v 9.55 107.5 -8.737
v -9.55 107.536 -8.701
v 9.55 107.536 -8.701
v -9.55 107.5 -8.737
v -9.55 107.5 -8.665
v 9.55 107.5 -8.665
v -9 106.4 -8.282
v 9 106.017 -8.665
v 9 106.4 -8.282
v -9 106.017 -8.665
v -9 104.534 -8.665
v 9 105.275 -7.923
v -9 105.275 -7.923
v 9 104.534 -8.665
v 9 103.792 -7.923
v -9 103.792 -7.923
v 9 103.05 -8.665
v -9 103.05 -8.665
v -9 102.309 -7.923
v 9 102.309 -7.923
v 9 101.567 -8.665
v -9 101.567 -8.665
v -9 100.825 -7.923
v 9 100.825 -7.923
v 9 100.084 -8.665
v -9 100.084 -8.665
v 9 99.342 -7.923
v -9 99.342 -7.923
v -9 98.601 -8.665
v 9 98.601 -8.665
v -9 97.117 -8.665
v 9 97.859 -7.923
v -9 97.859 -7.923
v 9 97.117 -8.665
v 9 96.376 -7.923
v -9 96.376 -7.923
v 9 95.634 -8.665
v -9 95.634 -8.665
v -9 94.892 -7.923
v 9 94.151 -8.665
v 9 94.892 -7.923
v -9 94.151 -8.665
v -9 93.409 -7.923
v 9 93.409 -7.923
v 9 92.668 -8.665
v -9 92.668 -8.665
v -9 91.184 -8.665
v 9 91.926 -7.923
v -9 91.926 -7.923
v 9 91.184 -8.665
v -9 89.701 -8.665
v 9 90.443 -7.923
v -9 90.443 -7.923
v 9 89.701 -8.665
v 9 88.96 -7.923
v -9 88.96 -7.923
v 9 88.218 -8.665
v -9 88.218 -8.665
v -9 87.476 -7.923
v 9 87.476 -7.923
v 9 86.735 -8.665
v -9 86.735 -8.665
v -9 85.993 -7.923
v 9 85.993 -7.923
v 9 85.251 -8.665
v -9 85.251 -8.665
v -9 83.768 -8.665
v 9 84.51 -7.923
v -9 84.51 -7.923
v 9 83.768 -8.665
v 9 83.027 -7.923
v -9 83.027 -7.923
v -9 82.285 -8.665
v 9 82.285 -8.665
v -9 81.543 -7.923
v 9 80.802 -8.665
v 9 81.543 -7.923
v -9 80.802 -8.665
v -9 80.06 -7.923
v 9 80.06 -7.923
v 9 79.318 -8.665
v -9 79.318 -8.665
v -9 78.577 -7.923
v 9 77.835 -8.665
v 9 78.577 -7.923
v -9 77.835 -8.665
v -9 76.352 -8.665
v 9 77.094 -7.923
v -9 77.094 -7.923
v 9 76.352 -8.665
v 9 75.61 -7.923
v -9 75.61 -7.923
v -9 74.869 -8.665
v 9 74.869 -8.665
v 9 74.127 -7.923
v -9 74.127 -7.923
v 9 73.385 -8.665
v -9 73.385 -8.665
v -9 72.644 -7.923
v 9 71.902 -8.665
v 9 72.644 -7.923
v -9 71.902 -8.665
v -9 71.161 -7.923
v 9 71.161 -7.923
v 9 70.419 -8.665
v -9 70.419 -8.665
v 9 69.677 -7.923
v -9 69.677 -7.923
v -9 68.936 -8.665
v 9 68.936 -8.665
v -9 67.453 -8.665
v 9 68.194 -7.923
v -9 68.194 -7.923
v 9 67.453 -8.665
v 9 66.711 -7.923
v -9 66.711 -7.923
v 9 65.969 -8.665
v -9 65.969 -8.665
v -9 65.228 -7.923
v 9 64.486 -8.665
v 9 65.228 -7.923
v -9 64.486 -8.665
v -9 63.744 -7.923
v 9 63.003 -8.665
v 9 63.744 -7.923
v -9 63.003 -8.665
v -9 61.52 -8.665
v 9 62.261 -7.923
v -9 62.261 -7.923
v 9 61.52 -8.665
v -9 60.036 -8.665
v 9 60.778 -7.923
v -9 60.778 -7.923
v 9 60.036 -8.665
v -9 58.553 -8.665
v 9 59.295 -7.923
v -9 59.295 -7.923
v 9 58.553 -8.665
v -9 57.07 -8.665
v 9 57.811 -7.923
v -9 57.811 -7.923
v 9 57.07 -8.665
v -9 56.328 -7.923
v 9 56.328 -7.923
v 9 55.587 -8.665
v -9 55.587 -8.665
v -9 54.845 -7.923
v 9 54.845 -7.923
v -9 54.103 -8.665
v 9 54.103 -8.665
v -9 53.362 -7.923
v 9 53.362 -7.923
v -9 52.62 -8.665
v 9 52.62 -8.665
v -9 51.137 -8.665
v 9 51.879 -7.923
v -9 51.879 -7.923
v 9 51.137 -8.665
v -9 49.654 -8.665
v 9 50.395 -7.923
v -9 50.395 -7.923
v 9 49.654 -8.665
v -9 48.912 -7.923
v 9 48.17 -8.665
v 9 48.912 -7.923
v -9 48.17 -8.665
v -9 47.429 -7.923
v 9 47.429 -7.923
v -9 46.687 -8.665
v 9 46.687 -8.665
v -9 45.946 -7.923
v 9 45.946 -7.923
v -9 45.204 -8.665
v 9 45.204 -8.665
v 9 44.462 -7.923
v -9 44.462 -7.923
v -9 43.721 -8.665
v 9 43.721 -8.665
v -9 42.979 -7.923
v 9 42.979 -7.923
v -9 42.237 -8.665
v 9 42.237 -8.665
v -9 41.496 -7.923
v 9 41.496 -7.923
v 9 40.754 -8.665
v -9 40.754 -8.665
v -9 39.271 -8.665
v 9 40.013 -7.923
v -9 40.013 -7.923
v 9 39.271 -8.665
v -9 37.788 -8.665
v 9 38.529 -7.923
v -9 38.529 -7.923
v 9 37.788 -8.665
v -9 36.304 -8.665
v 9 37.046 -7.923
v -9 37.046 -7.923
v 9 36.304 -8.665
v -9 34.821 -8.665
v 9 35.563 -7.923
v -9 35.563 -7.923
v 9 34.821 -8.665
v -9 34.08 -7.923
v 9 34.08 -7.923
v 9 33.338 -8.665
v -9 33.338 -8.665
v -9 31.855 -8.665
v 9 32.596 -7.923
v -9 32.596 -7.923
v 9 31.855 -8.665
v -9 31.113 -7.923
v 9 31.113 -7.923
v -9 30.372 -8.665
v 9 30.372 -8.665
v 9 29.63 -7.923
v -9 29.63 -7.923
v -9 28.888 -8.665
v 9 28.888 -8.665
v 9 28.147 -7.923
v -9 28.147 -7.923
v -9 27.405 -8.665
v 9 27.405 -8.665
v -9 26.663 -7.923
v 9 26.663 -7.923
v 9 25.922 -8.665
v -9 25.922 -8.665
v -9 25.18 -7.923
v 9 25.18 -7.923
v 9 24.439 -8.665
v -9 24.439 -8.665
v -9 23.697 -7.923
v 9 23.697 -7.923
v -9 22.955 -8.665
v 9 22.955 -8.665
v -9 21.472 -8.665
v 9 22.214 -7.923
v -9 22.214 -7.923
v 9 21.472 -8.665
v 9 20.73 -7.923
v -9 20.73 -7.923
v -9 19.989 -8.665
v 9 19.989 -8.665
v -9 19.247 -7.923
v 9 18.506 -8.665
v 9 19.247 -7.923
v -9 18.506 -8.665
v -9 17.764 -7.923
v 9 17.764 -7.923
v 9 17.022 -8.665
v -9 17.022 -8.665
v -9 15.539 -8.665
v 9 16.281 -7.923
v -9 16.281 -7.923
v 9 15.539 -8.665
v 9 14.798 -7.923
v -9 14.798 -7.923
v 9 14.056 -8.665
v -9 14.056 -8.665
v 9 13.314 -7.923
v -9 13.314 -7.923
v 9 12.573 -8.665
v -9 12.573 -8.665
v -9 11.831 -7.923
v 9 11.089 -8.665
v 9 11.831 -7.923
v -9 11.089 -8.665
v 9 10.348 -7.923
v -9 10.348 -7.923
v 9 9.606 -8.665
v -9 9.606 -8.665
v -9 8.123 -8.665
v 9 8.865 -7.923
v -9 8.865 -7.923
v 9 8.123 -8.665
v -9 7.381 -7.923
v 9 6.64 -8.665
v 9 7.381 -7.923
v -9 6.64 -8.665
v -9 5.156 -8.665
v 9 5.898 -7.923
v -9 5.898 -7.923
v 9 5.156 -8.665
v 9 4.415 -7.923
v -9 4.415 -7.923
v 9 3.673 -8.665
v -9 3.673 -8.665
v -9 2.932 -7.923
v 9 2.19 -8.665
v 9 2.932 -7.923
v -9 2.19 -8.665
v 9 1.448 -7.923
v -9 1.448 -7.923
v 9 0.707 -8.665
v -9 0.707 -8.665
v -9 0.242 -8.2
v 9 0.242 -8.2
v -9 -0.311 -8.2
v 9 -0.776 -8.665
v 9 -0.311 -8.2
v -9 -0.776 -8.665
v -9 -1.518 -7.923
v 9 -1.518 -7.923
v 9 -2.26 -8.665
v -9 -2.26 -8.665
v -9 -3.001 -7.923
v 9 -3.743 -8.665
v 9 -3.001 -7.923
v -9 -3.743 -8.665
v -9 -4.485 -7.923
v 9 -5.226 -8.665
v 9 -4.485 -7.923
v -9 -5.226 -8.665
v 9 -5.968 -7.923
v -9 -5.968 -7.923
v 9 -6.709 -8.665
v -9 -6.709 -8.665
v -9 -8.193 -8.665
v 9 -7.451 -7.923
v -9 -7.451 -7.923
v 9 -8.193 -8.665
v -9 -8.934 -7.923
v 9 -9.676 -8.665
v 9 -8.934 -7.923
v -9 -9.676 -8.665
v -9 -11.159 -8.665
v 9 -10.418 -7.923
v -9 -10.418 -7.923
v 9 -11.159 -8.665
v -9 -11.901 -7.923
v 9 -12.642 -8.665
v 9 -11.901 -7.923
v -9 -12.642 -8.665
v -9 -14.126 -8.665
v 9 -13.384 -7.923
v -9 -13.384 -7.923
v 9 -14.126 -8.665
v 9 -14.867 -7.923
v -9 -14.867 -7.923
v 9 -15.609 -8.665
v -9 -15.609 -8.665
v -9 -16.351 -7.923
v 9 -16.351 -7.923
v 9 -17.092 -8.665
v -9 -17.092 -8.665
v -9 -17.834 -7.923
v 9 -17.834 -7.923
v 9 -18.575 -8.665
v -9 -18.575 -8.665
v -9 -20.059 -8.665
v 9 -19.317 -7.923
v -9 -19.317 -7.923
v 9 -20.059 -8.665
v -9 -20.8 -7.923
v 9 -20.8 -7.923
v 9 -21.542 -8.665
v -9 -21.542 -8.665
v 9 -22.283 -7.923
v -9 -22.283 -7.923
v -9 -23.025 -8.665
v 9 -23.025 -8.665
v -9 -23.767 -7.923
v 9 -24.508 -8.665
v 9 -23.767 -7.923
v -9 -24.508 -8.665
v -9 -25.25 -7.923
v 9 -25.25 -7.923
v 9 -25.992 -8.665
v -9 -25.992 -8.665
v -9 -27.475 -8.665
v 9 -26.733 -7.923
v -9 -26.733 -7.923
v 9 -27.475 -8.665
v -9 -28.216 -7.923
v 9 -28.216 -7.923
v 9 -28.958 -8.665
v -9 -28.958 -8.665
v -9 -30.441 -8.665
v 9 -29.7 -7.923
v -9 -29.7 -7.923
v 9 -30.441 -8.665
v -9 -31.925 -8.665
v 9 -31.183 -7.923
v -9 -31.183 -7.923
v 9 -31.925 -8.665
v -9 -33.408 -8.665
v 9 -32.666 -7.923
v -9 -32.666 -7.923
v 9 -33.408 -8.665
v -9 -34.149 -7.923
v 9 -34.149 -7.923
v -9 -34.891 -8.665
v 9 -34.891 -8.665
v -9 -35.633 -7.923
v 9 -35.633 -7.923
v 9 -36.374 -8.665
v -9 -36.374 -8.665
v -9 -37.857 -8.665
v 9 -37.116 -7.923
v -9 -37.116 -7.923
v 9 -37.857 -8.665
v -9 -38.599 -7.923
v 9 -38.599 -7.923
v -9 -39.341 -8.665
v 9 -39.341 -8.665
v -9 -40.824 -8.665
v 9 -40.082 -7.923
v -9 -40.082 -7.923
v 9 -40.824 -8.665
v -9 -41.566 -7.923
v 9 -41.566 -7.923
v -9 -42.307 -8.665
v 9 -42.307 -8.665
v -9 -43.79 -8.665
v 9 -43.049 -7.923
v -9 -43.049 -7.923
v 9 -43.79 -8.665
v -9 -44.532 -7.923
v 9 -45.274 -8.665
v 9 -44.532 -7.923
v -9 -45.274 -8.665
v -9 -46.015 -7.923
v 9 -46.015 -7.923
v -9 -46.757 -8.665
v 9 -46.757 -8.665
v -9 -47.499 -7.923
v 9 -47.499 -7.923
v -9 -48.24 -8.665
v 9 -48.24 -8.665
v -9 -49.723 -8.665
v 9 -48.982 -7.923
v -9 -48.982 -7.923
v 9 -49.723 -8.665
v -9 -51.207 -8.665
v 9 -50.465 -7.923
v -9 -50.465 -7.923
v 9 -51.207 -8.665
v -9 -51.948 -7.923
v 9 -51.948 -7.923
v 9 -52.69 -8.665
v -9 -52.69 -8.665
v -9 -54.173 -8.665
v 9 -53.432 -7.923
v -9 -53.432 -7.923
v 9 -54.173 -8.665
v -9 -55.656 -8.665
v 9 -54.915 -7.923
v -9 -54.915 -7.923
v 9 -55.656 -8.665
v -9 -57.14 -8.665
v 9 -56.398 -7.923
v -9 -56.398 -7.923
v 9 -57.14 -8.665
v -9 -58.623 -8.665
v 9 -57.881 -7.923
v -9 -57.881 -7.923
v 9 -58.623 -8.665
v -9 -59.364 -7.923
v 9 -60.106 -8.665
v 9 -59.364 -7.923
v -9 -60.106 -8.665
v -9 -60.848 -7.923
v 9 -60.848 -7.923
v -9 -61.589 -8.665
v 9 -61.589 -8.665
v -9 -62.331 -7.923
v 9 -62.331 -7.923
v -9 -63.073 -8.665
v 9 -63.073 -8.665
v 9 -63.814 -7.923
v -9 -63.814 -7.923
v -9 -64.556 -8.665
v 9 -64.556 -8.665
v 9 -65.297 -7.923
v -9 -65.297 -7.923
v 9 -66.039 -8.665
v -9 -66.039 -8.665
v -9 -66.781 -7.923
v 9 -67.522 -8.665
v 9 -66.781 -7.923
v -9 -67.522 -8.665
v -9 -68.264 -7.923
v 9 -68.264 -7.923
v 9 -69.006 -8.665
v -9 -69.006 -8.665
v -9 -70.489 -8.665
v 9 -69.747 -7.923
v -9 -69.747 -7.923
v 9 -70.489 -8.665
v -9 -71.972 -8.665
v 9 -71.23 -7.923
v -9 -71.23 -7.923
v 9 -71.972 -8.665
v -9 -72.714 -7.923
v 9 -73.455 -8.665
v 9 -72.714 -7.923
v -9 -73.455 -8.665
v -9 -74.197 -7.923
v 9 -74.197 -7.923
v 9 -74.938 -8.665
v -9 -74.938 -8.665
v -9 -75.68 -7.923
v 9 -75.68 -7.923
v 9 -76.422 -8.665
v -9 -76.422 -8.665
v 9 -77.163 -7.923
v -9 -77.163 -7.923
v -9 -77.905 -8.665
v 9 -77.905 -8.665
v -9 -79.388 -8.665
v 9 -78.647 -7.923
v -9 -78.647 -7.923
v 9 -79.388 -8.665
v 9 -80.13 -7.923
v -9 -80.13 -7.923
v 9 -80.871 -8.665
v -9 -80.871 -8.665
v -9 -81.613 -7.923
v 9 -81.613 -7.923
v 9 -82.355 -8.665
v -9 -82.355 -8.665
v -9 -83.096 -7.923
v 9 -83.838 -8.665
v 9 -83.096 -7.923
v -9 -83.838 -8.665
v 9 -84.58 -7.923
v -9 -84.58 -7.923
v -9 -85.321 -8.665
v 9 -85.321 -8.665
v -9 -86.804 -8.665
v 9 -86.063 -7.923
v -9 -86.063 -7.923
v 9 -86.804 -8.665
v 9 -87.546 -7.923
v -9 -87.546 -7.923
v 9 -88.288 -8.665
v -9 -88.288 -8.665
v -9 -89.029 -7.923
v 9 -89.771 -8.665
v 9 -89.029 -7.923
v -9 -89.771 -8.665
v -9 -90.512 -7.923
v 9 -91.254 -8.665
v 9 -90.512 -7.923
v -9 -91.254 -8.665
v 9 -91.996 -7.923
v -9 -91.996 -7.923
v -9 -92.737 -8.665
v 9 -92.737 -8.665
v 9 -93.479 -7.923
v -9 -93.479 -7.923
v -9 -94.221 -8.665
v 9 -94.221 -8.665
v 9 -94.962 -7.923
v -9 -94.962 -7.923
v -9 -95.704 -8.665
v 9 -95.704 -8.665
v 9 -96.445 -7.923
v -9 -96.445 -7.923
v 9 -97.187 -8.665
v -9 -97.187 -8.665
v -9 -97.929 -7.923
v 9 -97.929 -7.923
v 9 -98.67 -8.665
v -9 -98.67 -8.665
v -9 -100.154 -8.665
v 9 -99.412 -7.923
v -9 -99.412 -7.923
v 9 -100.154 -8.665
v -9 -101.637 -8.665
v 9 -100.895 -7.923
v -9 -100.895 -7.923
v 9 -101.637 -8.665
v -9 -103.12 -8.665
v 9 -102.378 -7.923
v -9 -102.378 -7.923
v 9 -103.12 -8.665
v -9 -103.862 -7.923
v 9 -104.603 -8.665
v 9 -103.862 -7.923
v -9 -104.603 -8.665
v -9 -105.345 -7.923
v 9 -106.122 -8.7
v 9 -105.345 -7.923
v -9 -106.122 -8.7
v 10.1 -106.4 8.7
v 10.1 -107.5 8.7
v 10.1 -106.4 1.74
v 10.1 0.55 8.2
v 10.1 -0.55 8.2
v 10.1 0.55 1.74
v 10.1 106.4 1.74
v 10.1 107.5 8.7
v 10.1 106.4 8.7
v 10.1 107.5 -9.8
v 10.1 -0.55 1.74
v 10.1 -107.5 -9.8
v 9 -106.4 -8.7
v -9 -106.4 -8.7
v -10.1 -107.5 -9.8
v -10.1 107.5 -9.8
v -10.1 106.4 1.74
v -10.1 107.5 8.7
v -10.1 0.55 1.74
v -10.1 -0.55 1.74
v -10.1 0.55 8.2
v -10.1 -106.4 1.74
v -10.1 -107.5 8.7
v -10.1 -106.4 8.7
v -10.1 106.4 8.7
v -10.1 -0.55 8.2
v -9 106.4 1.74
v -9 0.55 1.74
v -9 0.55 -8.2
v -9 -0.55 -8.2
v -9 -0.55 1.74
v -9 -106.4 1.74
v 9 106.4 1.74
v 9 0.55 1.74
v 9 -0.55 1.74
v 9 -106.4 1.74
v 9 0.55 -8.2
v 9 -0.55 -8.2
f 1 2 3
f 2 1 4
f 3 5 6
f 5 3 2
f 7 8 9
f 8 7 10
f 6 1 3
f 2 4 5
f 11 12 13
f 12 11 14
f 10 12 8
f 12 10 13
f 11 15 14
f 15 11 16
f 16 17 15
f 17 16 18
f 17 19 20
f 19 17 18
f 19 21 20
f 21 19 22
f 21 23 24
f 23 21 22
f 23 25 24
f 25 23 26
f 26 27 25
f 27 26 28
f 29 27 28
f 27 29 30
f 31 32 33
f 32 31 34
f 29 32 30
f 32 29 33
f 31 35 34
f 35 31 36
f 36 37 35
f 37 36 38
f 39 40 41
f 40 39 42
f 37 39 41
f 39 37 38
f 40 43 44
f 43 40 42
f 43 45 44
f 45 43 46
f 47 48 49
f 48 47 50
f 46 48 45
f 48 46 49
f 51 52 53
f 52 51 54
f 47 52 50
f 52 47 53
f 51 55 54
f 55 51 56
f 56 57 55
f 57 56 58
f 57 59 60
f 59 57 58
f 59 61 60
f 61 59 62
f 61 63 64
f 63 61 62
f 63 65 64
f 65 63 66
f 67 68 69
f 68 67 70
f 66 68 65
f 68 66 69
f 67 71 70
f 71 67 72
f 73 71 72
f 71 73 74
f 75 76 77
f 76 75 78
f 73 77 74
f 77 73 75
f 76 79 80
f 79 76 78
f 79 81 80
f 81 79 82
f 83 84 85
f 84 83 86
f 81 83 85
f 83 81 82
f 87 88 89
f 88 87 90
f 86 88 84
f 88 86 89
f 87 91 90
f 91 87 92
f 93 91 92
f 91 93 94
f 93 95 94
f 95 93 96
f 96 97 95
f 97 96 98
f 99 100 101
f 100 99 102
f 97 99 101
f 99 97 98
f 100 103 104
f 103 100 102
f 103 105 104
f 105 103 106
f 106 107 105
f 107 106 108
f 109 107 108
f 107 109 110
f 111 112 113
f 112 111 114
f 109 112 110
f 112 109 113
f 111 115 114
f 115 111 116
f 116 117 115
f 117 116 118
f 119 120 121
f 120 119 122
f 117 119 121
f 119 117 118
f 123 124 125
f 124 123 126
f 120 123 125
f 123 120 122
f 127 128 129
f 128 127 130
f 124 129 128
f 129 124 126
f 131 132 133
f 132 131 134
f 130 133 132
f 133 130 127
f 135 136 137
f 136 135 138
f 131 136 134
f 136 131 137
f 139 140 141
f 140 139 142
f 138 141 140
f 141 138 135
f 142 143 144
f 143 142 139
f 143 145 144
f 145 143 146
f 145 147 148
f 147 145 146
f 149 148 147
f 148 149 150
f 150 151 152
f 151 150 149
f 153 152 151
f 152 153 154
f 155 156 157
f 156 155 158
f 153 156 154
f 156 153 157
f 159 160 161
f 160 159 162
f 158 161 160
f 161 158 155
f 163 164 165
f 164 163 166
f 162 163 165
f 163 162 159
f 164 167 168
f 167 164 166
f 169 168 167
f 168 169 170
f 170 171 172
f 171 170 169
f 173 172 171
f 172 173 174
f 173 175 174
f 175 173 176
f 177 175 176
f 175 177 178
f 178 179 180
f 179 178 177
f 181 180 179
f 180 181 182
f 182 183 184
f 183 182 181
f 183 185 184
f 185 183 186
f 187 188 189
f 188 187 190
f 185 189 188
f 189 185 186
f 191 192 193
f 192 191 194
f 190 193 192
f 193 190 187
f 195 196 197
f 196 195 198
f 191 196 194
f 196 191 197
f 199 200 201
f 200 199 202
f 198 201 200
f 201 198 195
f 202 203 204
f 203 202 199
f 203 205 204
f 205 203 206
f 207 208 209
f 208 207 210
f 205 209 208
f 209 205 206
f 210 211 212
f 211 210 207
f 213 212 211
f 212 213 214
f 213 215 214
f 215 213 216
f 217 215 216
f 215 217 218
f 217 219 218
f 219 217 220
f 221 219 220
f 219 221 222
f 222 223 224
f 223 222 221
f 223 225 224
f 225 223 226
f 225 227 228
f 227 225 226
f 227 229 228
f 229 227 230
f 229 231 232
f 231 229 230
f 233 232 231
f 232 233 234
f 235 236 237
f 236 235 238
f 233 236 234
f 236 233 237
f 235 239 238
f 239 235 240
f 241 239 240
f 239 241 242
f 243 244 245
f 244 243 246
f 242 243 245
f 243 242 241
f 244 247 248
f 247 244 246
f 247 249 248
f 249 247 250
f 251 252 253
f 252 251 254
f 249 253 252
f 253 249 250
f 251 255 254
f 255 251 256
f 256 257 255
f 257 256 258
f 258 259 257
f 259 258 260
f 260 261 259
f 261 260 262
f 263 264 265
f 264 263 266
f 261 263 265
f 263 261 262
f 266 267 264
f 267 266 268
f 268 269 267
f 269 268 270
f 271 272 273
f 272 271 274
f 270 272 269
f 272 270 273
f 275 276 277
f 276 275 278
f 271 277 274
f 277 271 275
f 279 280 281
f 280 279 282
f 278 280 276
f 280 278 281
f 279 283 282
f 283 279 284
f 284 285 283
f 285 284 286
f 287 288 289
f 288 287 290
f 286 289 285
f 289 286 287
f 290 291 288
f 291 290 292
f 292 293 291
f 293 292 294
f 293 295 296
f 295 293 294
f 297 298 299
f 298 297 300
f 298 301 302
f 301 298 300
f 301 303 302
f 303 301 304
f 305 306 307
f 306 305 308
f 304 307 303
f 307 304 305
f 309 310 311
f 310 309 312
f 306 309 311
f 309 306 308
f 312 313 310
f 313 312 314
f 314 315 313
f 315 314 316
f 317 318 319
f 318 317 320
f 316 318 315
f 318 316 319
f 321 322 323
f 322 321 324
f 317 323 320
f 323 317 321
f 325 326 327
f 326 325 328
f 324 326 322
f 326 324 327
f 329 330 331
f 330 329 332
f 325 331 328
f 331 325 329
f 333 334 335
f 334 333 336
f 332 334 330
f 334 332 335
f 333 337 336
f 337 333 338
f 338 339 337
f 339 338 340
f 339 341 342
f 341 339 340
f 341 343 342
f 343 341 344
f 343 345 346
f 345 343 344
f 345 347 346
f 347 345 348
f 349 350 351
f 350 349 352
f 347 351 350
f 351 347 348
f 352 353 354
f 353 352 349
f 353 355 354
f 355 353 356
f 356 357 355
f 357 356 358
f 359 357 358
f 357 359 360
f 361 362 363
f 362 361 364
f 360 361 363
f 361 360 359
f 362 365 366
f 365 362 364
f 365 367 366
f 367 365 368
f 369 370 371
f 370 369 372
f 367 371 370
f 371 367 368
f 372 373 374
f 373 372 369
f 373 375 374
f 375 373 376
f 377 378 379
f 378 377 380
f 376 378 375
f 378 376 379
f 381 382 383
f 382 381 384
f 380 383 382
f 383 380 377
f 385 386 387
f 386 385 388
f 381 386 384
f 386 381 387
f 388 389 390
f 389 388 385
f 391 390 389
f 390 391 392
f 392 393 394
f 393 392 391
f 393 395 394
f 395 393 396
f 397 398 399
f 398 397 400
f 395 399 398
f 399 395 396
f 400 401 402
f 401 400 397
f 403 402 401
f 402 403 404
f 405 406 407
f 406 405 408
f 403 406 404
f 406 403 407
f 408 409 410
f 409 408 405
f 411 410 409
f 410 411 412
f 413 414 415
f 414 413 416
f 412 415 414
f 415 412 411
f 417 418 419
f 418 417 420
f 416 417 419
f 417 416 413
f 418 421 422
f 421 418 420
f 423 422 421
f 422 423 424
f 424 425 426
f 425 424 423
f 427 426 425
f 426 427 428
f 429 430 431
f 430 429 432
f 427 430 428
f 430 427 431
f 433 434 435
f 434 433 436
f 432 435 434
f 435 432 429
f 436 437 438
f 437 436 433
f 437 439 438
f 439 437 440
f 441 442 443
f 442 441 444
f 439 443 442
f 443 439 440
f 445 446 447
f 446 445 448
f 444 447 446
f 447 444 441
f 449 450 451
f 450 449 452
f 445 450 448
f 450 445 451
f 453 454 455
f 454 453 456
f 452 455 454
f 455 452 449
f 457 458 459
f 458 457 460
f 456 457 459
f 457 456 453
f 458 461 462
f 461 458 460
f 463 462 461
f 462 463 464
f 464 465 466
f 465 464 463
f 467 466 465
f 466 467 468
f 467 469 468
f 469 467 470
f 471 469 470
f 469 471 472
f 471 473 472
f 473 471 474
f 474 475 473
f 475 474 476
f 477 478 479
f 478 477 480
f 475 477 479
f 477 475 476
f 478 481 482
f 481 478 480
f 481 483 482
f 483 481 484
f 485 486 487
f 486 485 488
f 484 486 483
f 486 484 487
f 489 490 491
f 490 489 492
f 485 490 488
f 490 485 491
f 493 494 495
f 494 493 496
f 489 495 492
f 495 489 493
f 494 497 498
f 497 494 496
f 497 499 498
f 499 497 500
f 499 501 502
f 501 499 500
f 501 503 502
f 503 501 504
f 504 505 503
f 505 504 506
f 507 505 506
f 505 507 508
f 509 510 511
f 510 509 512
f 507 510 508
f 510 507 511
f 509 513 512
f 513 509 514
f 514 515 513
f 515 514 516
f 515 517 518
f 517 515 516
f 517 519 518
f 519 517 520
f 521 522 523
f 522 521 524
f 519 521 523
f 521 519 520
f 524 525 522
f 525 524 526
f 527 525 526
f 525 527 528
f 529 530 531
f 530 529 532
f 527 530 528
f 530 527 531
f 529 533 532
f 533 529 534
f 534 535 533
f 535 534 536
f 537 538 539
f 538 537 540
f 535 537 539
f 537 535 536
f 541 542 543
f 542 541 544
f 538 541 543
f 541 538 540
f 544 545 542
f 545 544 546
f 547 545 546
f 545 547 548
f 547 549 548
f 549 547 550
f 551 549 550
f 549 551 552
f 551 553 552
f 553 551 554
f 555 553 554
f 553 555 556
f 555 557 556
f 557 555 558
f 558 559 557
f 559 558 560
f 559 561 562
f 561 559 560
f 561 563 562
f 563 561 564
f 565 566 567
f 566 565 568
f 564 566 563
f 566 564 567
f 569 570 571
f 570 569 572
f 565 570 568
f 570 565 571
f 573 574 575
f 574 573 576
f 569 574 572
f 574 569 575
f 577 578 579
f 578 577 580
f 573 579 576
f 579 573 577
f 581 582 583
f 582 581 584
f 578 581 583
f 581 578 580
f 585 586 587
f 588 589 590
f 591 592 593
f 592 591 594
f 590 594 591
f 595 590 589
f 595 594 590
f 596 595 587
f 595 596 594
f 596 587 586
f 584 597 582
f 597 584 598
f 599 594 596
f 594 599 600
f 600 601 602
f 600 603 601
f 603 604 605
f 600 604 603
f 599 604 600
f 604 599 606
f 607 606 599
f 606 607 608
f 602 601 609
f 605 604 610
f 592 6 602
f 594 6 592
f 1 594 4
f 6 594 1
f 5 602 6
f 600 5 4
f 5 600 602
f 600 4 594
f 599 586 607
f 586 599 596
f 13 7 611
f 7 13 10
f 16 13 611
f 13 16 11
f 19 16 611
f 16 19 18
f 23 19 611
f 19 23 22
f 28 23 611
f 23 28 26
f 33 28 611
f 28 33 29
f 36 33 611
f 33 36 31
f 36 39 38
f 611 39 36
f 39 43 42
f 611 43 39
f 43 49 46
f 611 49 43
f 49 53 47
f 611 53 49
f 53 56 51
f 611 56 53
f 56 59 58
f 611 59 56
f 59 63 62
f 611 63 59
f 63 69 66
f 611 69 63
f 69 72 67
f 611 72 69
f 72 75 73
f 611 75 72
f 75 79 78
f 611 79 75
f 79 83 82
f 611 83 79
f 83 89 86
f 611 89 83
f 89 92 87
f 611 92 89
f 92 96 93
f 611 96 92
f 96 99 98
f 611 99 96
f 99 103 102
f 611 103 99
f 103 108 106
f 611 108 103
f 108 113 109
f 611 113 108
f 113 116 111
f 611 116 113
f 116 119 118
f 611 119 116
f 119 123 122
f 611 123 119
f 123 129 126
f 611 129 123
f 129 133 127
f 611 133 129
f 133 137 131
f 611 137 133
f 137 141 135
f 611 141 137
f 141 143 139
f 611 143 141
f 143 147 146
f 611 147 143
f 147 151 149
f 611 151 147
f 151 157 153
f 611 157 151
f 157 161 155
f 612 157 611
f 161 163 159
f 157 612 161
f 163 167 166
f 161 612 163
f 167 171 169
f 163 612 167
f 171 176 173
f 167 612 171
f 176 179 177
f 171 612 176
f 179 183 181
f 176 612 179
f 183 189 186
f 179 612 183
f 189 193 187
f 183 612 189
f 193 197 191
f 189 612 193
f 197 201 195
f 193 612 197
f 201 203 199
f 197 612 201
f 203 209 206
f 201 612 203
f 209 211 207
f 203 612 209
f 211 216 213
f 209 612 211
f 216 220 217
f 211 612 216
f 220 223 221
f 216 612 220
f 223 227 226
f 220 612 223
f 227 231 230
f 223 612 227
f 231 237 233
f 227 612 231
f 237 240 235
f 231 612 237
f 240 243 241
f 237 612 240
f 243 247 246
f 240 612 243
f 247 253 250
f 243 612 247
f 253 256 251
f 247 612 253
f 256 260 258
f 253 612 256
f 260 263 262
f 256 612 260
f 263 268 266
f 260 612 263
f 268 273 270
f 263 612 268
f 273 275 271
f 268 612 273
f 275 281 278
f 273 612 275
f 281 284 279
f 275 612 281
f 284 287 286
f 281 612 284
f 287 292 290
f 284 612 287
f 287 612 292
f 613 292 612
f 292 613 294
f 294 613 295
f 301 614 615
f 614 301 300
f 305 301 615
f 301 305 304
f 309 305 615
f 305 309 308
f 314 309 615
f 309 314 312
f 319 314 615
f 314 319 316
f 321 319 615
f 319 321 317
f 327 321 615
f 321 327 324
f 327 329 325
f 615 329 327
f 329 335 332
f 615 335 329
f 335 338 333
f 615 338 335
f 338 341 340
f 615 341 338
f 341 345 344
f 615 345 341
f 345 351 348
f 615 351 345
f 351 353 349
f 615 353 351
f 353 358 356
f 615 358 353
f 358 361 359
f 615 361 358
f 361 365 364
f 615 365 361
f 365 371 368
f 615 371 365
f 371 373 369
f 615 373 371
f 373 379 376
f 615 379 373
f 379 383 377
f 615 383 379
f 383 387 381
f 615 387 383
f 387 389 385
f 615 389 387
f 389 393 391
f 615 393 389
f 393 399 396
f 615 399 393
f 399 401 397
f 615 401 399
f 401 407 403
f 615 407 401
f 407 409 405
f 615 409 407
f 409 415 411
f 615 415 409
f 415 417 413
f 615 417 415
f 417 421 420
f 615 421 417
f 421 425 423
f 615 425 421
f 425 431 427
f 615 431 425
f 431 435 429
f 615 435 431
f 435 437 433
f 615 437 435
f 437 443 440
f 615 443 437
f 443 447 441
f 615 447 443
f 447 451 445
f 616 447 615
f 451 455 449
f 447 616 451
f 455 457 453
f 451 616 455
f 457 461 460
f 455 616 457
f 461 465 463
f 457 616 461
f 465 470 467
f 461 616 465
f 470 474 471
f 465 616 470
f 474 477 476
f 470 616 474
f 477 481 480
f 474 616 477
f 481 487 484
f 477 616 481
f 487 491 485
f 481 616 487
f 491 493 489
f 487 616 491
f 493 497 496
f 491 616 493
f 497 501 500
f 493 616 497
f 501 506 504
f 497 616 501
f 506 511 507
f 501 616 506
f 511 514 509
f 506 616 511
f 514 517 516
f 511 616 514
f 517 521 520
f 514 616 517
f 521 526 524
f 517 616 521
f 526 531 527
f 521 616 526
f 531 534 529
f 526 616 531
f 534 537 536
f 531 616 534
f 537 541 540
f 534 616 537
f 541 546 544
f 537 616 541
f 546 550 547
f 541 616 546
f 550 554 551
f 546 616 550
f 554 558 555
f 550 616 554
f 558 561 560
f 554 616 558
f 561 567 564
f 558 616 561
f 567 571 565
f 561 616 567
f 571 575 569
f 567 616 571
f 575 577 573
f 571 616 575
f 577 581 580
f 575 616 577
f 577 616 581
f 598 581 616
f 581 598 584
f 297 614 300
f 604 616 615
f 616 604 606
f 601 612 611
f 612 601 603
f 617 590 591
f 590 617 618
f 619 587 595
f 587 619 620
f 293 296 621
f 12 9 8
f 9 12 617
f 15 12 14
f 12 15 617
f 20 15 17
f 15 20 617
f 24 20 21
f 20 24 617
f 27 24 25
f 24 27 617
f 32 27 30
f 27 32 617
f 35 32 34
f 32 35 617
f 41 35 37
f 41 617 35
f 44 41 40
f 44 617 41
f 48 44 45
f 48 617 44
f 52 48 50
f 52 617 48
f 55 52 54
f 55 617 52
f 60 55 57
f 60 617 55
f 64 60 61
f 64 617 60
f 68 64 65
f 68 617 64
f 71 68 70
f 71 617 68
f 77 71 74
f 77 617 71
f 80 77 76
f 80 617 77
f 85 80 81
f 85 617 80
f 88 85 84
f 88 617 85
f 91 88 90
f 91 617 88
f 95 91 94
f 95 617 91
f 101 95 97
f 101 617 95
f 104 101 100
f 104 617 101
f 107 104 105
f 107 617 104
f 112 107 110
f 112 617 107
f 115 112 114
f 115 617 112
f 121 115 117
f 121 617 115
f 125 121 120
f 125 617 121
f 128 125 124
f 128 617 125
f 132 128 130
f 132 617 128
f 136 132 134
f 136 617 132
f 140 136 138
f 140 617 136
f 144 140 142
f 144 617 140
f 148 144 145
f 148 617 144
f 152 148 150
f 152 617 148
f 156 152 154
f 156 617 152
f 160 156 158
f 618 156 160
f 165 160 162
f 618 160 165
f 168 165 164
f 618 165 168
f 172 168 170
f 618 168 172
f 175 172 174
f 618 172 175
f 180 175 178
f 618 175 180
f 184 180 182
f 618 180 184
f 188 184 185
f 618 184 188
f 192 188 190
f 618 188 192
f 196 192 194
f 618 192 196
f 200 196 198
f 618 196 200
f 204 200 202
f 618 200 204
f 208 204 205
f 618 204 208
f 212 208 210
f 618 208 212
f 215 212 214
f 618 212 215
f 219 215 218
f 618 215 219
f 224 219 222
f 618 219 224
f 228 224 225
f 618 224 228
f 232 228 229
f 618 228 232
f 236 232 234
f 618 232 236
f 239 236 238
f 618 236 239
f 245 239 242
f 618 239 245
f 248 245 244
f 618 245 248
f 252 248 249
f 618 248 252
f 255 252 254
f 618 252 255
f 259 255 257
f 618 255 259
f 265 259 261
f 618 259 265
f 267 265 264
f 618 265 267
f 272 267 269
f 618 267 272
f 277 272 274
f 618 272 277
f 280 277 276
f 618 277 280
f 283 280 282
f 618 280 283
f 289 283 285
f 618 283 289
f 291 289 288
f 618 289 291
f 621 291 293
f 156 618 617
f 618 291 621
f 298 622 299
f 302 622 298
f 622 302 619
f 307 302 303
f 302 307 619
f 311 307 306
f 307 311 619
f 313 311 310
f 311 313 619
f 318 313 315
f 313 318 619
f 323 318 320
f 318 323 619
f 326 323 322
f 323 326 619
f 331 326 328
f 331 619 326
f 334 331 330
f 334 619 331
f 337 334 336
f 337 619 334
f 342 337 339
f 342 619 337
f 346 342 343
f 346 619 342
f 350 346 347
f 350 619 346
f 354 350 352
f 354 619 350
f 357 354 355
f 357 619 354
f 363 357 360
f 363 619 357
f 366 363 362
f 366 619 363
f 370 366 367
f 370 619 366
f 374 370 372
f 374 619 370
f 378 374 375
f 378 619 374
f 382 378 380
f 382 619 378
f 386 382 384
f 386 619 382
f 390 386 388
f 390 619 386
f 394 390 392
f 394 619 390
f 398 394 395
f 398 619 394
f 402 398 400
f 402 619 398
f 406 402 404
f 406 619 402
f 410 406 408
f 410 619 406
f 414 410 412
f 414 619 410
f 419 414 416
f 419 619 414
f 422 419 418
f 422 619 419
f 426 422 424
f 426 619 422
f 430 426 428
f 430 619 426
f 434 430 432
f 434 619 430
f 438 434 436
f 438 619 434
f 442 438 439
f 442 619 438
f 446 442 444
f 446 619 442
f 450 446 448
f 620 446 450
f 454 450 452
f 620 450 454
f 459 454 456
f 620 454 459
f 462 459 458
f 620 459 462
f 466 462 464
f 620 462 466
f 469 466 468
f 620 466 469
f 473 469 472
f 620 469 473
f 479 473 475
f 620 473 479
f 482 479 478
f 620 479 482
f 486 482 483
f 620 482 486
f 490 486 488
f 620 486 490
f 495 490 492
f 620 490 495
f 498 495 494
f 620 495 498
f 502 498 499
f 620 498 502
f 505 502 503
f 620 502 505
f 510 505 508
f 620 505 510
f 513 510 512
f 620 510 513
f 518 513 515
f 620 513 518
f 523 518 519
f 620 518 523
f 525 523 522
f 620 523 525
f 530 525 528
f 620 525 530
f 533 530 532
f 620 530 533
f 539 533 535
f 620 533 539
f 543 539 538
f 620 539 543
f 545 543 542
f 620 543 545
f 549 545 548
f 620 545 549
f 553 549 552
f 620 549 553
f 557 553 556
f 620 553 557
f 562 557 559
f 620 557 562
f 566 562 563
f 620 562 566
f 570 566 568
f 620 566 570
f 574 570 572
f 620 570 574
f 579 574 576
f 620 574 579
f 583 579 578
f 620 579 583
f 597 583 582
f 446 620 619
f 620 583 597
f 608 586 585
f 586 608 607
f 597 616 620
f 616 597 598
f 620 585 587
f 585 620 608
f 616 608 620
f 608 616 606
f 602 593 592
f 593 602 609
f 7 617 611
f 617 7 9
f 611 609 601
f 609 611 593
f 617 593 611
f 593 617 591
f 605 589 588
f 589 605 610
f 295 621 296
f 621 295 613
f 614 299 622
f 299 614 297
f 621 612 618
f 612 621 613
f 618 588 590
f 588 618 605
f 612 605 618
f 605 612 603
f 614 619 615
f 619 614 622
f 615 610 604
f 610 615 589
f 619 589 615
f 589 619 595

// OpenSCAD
//
// trays/redstrike.scad

// unit is mm

// w250 x d210 x h220 (Prusa MK4 bed dimensions)

o2 = 0.2;

box_width = 215;   // 22cm actually
box_length = 295;  // 30cm actually // not used...
bw = box_width;
bl = box_length;
//box_height = 40;   // "remaining height"

counter_side = 18;
counter_diameter = counter_side;
counter_thickness = 1.1;
ct = counter_thickness;

wall_thickness = 1.1;
wt = wall_thickness;
wt2 = wt * 2;

//tray_height = counter_side;
tray_height = 17 + 0.4;
th = tray_height;

lens_diameter = 18;
lens_height = 0.8;

//module lens(depth) {
//  difference() {
//    sphere(d=lens_diameter, center=true, $fn=60);
//    translate([ 0, lens_height, 0 ])
//      cube(
//        [ lens_diameter * 1.0, lens_diameter, lens_diameter * 1.0 ],
//        center=true);
//  }
//}
//lens(length_height);


module column() {

  dw = counter_side / 2 + wt / 2;
  dy = box_width / 2 - wt / 2;

  c = sqrt(ct / 2);

  translate([ 0, 0, -tray_height / 2 - wt / 2 ])
    cube([ counter_side + wt2, box_width, wt ], center=true);

  side_height = tray_height * 0.6;
  sdz = (tray_height - side_height) / 2;

  translate([ -dw, 0, -sdz ])
    cube([ wt, box_width, side_height ], center=true);
  translate([ dw, 0, -sdz ])
    cube([ wt, box_width, side_height ], center=true);

  translate([ 0, -dy, 0 ])
    cube([ counter_side + wt2, wt, tray_height ], center=true);
  translate([ 0, dy, 0 ])
    cube([ counter_side + wt2, wt, tray_height ], center=true);
  translate([ 0, 0, 0 ])
    cube([ counter_side + wt2, wt, tray_height - 5 * o2 ], center=true);

  //echo("slots", (bw - wt2) / (c * 2) + 1);

  for (i = [ 0 : (bw - wt2) / (c * 2) + 0 ]) {

    translate([ 0, bw / 2 - i * c * 2 - c, -th / 2 - wt / 2 + c * 0.74 ])
      rotate([ 45, 0, 0 ])
        cube([ counter_side + wt, ct, ct ], center=true);
  }
}
column();


module lid() {

  lid_length = bw + 2 * wt + 2 * o2;
  lid_width = counter_side + 2 * wt2 + 2 * o2;
  lid_height = tray_height * 0.8;

  dx = counter_side / 2 + wt / 2 + wt + o2;

  translate([ dx, 0, 0 ])
    cube([ wt, lid_length, lid_height ], center=true);
  translate([ -dx, 0, 0 ])
    cube([ wt, lid_length, lid_height ], center=true);

  translate([ 0, -lid_length / 2 + wt / 2, 0 ])
    cube([ lid_width, wt, lid_height ], center=true);
  translate([ 0, lid_length / 2 - wt / 2, 0 ])
    cube([ lid_width, wt, lid_height ], center=true);

  translate([ 0, 0, lid_height / 2 - wt / 2 ])
    cube([ lid_width, lid_length, wt ], center=true);
}
//translate([ 0, 0, 3 ]) lid();
